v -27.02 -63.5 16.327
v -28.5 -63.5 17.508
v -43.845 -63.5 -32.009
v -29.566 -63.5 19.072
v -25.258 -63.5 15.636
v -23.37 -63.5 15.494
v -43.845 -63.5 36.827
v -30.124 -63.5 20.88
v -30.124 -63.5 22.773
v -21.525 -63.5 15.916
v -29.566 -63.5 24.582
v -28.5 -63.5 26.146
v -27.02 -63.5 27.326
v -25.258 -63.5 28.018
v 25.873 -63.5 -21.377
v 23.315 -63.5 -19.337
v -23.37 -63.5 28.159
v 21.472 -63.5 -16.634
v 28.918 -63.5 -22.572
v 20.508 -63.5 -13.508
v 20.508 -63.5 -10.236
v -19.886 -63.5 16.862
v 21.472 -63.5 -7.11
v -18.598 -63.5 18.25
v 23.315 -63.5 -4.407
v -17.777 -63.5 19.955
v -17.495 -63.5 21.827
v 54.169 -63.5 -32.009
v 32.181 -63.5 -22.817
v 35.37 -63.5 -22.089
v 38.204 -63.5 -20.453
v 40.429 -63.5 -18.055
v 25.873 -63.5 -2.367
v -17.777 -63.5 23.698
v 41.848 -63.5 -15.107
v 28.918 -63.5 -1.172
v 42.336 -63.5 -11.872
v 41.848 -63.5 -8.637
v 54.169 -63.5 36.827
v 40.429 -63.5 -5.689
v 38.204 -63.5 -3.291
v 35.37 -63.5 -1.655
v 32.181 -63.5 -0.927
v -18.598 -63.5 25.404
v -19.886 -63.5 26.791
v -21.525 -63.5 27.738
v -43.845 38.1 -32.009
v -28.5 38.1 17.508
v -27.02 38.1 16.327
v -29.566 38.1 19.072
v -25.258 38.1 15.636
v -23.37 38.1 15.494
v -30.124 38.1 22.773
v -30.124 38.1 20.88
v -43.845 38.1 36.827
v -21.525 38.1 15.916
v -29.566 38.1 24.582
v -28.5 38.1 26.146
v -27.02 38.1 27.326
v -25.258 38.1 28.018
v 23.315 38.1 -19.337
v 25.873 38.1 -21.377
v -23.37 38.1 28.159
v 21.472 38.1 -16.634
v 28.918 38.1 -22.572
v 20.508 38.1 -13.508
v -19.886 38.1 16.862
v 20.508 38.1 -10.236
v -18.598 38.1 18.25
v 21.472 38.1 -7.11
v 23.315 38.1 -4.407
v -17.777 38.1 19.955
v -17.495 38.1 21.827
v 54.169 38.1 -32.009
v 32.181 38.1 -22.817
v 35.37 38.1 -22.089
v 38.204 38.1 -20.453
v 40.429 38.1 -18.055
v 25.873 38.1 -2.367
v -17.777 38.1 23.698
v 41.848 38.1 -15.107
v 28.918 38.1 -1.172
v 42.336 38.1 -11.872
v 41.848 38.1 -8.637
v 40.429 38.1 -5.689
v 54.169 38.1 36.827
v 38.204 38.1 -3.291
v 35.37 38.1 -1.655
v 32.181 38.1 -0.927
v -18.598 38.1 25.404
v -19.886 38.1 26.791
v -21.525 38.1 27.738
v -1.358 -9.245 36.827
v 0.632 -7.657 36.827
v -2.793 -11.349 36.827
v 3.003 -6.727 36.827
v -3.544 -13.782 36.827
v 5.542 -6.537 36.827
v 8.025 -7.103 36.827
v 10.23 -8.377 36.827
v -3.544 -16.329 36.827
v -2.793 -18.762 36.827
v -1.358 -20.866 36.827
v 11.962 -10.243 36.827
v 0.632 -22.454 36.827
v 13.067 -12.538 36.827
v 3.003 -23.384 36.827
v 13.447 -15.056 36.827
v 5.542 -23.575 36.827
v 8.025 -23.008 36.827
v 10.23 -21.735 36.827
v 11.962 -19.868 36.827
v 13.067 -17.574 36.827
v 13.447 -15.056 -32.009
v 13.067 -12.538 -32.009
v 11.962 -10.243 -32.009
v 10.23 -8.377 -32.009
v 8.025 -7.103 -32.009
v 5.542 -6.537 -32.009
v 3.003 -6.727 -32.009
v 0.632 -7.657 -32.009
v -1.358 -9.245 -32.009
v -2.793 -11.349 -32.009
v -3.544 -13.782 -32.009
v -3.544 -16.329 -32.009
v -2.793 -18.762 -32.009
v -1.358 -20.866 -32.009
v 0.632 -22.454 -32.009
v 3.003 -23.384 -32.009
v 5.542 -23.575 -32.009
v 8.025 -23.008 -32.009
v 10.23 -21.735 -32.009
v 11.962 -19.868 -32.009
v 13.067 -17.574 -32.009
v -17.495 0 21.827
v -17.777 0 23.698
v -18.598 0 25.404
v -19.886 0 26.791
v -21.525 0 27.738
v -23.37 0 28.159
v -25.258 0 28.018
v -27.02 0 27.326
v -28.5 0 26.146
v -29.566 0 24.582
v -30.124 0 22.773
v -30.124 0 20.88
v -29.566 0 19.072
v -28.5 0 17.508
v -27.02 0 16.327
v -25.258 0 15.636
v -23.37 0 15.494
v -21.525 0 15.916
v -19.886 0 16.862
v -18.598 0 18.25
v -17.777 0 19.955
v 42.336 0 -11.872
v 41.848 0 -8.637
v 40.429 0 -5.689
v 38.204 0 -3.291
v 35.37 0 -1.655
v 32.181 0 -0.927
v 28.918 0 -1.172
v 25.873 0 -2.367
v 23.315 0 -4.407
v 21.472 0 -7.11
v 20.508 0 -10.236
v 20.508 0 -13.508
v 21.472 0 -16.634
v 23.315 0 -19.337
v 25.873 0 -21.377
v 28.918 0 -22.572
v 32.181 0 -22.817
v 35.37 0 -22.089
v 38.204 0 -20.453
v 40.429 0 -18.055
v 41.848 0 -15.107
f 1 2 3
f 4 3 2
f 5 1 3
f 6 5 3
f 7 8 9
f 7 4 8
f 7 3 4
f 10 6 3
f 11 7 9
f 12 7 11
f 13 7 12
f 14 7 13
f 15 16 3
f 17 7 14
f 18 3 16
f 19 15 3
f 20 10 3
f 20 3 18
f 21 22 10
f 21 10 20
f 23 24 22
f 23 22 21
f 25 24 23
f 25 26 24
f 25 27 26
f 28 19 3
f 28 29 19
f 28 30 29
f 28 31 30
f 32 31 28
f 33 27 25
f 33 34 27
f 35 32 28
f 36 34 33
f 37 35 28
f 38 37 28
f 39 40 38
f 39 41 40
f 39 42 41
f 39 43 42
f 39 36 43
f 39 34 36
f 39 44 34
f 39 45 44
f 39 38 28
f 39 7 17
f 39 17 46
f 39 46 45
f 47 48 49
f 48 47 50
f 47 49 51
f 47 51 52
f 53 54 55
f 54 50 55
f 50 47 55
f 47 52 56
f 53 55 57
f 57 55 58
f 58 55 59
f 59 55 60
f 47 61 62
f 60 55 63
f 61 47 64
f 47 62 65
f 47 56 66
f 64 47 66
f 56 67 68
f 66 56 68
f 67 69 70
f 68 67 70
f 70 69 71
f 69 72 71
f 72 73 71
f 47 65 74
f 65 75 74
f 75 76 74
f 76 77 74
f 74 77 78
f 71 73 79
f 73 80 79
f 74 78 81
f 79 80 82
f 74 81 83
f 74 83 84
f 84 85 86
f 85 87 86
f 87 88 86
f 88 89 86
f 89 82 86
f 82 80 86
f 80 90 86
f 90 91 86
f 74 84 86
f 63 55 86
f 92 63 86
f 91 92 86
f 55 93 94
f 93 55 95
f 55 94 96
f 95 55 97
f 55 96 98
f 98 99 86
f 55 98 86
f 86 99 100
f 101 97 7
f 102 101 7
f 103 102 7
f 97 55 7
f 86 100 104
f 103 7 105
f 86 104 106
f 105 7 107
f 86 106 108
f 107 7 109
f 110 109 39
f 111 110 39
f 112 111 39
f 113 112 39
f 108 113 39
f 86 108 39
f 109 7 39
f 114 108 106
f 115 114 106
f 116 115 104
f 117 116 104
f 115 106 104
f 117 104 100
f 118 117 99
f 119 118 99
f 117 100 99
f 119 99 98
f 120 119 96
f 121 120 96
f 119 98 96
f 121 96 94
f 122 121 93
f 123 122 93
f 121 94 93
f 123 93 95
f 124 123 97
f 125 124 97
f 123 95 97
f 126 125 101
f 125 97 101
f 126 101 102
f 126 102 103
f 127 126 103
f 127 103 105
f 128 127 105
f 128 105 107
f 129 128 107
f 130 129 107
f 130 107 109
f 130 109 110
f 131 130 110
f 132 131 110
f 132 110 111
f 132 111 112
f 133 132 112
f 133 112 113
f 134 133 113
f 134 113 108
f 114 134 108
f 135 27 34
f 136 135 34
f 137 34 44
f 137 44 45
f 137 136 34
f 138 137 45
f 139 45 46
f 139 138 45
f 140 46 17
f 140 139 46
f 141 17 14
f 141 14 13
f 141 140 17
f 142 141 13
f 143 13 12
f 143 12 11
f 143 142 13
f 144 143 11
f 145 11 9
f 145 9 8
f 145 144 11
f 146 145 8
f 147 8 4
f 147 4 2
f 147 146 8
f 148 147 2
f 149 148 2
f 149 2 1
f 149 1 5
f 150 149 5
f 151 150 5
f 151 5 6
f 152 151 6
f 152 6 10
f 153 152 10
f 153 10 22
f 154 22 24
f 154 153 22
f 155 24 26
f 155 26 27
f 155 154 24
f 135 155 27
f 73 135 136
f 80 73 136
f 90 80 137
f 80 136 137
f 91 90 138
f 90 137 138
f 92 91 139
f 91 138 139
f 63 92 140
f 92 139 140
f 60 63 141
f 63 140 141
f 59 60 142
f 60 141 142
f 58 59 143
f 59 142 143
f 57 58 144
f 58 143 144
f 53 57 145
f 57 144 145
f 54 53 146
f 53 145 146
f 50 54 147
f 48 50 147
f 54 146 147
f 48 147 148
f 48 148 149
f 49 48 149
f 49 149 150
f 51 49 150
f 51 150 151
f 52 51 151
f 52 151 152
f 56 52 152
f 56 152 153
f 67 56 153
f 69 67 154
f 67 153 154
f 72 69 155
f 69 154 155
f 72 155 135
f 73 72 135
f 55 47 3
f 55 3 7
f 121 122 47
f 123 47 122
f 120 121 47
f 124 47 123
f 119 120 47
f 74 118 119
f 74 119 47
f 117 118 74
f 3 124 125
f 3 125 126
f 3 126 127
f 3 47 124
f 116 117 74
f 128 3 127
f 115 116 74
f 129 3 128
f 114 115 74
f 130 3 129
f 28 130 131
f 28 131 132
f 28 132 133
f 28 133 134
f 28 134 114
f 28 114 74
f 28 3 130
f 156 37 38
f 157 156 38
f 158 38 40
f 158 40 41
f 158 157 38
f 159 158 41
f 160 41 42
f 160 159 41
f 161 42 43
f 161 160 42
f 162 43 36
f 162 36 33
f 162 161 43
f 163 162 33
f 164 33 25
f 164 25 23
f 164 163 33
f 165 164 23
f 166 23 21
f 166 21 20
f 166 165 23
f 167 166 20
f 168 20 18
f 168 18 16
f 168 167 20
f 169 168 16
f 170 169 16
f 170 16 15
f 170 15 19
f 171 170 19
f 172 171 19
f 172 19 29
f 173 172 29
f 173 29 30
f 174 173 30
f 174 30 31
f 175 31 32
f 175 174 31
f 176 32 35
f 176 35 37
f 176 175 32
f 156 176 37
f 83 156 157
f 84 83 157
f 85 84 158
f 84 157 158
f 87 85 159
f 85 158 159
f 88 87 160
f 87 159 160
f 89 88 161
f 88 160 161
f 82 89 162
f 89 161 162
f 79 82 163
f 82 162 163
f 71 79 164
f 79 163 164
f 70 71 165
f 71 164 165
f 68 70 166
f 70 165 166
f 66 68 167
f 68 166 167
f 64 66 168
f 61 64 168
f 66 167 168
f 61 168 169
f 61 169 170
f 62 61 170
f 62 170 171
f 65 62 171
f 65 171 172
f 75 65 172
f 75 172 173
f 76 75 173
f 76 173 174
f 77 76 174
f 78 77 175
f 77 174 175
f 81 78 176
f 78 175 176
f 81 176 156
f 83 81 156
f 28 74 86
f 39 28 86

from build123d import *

# Parameters (mm, degrees)
F0_W          = 98.013702
F0_H          = 68.835622
F0_R          = 10.97537
F0_R_2        = 6.35
F1_DEPTH      = 63.5
F1_DEPTH_BACK = 38.1
F2_R          = 8.54279
F3_DEPTH      = 68.836623


with BuildPart() as f1:
    # F0 (on Front) → F1 (new body, two sides)
    with BuildSketch(Plane.XZ) as f1_sk:
        with Locations((5.161934, 2.408902)):
            Rectangle(F0_W, F0_H)
        with Locations((31.360572, -11.87192)):
            Circle(F0_R, mode=Mode.SUBTRACT)
        with Locations((-23.844917, 21.826713)):
            Circle(F0_R_2, mode=Mode.SUBTRACT)
    extrude(amount=F1_DEPTH)
    extrude(f1_sk.sketch, amount=-F1_DEPTH_BACK)

    # F2 (on face) → F3 (cut, through all)
    with BuildSketch(Plane.XY.offset(36.826713)):
        with Locations((4.90384, -15.055645)):
            Circle(F2_R)
    extrude(amount=-F3_DEPTH, mode=Mode.SUBTRACT)


solid = f1.part
